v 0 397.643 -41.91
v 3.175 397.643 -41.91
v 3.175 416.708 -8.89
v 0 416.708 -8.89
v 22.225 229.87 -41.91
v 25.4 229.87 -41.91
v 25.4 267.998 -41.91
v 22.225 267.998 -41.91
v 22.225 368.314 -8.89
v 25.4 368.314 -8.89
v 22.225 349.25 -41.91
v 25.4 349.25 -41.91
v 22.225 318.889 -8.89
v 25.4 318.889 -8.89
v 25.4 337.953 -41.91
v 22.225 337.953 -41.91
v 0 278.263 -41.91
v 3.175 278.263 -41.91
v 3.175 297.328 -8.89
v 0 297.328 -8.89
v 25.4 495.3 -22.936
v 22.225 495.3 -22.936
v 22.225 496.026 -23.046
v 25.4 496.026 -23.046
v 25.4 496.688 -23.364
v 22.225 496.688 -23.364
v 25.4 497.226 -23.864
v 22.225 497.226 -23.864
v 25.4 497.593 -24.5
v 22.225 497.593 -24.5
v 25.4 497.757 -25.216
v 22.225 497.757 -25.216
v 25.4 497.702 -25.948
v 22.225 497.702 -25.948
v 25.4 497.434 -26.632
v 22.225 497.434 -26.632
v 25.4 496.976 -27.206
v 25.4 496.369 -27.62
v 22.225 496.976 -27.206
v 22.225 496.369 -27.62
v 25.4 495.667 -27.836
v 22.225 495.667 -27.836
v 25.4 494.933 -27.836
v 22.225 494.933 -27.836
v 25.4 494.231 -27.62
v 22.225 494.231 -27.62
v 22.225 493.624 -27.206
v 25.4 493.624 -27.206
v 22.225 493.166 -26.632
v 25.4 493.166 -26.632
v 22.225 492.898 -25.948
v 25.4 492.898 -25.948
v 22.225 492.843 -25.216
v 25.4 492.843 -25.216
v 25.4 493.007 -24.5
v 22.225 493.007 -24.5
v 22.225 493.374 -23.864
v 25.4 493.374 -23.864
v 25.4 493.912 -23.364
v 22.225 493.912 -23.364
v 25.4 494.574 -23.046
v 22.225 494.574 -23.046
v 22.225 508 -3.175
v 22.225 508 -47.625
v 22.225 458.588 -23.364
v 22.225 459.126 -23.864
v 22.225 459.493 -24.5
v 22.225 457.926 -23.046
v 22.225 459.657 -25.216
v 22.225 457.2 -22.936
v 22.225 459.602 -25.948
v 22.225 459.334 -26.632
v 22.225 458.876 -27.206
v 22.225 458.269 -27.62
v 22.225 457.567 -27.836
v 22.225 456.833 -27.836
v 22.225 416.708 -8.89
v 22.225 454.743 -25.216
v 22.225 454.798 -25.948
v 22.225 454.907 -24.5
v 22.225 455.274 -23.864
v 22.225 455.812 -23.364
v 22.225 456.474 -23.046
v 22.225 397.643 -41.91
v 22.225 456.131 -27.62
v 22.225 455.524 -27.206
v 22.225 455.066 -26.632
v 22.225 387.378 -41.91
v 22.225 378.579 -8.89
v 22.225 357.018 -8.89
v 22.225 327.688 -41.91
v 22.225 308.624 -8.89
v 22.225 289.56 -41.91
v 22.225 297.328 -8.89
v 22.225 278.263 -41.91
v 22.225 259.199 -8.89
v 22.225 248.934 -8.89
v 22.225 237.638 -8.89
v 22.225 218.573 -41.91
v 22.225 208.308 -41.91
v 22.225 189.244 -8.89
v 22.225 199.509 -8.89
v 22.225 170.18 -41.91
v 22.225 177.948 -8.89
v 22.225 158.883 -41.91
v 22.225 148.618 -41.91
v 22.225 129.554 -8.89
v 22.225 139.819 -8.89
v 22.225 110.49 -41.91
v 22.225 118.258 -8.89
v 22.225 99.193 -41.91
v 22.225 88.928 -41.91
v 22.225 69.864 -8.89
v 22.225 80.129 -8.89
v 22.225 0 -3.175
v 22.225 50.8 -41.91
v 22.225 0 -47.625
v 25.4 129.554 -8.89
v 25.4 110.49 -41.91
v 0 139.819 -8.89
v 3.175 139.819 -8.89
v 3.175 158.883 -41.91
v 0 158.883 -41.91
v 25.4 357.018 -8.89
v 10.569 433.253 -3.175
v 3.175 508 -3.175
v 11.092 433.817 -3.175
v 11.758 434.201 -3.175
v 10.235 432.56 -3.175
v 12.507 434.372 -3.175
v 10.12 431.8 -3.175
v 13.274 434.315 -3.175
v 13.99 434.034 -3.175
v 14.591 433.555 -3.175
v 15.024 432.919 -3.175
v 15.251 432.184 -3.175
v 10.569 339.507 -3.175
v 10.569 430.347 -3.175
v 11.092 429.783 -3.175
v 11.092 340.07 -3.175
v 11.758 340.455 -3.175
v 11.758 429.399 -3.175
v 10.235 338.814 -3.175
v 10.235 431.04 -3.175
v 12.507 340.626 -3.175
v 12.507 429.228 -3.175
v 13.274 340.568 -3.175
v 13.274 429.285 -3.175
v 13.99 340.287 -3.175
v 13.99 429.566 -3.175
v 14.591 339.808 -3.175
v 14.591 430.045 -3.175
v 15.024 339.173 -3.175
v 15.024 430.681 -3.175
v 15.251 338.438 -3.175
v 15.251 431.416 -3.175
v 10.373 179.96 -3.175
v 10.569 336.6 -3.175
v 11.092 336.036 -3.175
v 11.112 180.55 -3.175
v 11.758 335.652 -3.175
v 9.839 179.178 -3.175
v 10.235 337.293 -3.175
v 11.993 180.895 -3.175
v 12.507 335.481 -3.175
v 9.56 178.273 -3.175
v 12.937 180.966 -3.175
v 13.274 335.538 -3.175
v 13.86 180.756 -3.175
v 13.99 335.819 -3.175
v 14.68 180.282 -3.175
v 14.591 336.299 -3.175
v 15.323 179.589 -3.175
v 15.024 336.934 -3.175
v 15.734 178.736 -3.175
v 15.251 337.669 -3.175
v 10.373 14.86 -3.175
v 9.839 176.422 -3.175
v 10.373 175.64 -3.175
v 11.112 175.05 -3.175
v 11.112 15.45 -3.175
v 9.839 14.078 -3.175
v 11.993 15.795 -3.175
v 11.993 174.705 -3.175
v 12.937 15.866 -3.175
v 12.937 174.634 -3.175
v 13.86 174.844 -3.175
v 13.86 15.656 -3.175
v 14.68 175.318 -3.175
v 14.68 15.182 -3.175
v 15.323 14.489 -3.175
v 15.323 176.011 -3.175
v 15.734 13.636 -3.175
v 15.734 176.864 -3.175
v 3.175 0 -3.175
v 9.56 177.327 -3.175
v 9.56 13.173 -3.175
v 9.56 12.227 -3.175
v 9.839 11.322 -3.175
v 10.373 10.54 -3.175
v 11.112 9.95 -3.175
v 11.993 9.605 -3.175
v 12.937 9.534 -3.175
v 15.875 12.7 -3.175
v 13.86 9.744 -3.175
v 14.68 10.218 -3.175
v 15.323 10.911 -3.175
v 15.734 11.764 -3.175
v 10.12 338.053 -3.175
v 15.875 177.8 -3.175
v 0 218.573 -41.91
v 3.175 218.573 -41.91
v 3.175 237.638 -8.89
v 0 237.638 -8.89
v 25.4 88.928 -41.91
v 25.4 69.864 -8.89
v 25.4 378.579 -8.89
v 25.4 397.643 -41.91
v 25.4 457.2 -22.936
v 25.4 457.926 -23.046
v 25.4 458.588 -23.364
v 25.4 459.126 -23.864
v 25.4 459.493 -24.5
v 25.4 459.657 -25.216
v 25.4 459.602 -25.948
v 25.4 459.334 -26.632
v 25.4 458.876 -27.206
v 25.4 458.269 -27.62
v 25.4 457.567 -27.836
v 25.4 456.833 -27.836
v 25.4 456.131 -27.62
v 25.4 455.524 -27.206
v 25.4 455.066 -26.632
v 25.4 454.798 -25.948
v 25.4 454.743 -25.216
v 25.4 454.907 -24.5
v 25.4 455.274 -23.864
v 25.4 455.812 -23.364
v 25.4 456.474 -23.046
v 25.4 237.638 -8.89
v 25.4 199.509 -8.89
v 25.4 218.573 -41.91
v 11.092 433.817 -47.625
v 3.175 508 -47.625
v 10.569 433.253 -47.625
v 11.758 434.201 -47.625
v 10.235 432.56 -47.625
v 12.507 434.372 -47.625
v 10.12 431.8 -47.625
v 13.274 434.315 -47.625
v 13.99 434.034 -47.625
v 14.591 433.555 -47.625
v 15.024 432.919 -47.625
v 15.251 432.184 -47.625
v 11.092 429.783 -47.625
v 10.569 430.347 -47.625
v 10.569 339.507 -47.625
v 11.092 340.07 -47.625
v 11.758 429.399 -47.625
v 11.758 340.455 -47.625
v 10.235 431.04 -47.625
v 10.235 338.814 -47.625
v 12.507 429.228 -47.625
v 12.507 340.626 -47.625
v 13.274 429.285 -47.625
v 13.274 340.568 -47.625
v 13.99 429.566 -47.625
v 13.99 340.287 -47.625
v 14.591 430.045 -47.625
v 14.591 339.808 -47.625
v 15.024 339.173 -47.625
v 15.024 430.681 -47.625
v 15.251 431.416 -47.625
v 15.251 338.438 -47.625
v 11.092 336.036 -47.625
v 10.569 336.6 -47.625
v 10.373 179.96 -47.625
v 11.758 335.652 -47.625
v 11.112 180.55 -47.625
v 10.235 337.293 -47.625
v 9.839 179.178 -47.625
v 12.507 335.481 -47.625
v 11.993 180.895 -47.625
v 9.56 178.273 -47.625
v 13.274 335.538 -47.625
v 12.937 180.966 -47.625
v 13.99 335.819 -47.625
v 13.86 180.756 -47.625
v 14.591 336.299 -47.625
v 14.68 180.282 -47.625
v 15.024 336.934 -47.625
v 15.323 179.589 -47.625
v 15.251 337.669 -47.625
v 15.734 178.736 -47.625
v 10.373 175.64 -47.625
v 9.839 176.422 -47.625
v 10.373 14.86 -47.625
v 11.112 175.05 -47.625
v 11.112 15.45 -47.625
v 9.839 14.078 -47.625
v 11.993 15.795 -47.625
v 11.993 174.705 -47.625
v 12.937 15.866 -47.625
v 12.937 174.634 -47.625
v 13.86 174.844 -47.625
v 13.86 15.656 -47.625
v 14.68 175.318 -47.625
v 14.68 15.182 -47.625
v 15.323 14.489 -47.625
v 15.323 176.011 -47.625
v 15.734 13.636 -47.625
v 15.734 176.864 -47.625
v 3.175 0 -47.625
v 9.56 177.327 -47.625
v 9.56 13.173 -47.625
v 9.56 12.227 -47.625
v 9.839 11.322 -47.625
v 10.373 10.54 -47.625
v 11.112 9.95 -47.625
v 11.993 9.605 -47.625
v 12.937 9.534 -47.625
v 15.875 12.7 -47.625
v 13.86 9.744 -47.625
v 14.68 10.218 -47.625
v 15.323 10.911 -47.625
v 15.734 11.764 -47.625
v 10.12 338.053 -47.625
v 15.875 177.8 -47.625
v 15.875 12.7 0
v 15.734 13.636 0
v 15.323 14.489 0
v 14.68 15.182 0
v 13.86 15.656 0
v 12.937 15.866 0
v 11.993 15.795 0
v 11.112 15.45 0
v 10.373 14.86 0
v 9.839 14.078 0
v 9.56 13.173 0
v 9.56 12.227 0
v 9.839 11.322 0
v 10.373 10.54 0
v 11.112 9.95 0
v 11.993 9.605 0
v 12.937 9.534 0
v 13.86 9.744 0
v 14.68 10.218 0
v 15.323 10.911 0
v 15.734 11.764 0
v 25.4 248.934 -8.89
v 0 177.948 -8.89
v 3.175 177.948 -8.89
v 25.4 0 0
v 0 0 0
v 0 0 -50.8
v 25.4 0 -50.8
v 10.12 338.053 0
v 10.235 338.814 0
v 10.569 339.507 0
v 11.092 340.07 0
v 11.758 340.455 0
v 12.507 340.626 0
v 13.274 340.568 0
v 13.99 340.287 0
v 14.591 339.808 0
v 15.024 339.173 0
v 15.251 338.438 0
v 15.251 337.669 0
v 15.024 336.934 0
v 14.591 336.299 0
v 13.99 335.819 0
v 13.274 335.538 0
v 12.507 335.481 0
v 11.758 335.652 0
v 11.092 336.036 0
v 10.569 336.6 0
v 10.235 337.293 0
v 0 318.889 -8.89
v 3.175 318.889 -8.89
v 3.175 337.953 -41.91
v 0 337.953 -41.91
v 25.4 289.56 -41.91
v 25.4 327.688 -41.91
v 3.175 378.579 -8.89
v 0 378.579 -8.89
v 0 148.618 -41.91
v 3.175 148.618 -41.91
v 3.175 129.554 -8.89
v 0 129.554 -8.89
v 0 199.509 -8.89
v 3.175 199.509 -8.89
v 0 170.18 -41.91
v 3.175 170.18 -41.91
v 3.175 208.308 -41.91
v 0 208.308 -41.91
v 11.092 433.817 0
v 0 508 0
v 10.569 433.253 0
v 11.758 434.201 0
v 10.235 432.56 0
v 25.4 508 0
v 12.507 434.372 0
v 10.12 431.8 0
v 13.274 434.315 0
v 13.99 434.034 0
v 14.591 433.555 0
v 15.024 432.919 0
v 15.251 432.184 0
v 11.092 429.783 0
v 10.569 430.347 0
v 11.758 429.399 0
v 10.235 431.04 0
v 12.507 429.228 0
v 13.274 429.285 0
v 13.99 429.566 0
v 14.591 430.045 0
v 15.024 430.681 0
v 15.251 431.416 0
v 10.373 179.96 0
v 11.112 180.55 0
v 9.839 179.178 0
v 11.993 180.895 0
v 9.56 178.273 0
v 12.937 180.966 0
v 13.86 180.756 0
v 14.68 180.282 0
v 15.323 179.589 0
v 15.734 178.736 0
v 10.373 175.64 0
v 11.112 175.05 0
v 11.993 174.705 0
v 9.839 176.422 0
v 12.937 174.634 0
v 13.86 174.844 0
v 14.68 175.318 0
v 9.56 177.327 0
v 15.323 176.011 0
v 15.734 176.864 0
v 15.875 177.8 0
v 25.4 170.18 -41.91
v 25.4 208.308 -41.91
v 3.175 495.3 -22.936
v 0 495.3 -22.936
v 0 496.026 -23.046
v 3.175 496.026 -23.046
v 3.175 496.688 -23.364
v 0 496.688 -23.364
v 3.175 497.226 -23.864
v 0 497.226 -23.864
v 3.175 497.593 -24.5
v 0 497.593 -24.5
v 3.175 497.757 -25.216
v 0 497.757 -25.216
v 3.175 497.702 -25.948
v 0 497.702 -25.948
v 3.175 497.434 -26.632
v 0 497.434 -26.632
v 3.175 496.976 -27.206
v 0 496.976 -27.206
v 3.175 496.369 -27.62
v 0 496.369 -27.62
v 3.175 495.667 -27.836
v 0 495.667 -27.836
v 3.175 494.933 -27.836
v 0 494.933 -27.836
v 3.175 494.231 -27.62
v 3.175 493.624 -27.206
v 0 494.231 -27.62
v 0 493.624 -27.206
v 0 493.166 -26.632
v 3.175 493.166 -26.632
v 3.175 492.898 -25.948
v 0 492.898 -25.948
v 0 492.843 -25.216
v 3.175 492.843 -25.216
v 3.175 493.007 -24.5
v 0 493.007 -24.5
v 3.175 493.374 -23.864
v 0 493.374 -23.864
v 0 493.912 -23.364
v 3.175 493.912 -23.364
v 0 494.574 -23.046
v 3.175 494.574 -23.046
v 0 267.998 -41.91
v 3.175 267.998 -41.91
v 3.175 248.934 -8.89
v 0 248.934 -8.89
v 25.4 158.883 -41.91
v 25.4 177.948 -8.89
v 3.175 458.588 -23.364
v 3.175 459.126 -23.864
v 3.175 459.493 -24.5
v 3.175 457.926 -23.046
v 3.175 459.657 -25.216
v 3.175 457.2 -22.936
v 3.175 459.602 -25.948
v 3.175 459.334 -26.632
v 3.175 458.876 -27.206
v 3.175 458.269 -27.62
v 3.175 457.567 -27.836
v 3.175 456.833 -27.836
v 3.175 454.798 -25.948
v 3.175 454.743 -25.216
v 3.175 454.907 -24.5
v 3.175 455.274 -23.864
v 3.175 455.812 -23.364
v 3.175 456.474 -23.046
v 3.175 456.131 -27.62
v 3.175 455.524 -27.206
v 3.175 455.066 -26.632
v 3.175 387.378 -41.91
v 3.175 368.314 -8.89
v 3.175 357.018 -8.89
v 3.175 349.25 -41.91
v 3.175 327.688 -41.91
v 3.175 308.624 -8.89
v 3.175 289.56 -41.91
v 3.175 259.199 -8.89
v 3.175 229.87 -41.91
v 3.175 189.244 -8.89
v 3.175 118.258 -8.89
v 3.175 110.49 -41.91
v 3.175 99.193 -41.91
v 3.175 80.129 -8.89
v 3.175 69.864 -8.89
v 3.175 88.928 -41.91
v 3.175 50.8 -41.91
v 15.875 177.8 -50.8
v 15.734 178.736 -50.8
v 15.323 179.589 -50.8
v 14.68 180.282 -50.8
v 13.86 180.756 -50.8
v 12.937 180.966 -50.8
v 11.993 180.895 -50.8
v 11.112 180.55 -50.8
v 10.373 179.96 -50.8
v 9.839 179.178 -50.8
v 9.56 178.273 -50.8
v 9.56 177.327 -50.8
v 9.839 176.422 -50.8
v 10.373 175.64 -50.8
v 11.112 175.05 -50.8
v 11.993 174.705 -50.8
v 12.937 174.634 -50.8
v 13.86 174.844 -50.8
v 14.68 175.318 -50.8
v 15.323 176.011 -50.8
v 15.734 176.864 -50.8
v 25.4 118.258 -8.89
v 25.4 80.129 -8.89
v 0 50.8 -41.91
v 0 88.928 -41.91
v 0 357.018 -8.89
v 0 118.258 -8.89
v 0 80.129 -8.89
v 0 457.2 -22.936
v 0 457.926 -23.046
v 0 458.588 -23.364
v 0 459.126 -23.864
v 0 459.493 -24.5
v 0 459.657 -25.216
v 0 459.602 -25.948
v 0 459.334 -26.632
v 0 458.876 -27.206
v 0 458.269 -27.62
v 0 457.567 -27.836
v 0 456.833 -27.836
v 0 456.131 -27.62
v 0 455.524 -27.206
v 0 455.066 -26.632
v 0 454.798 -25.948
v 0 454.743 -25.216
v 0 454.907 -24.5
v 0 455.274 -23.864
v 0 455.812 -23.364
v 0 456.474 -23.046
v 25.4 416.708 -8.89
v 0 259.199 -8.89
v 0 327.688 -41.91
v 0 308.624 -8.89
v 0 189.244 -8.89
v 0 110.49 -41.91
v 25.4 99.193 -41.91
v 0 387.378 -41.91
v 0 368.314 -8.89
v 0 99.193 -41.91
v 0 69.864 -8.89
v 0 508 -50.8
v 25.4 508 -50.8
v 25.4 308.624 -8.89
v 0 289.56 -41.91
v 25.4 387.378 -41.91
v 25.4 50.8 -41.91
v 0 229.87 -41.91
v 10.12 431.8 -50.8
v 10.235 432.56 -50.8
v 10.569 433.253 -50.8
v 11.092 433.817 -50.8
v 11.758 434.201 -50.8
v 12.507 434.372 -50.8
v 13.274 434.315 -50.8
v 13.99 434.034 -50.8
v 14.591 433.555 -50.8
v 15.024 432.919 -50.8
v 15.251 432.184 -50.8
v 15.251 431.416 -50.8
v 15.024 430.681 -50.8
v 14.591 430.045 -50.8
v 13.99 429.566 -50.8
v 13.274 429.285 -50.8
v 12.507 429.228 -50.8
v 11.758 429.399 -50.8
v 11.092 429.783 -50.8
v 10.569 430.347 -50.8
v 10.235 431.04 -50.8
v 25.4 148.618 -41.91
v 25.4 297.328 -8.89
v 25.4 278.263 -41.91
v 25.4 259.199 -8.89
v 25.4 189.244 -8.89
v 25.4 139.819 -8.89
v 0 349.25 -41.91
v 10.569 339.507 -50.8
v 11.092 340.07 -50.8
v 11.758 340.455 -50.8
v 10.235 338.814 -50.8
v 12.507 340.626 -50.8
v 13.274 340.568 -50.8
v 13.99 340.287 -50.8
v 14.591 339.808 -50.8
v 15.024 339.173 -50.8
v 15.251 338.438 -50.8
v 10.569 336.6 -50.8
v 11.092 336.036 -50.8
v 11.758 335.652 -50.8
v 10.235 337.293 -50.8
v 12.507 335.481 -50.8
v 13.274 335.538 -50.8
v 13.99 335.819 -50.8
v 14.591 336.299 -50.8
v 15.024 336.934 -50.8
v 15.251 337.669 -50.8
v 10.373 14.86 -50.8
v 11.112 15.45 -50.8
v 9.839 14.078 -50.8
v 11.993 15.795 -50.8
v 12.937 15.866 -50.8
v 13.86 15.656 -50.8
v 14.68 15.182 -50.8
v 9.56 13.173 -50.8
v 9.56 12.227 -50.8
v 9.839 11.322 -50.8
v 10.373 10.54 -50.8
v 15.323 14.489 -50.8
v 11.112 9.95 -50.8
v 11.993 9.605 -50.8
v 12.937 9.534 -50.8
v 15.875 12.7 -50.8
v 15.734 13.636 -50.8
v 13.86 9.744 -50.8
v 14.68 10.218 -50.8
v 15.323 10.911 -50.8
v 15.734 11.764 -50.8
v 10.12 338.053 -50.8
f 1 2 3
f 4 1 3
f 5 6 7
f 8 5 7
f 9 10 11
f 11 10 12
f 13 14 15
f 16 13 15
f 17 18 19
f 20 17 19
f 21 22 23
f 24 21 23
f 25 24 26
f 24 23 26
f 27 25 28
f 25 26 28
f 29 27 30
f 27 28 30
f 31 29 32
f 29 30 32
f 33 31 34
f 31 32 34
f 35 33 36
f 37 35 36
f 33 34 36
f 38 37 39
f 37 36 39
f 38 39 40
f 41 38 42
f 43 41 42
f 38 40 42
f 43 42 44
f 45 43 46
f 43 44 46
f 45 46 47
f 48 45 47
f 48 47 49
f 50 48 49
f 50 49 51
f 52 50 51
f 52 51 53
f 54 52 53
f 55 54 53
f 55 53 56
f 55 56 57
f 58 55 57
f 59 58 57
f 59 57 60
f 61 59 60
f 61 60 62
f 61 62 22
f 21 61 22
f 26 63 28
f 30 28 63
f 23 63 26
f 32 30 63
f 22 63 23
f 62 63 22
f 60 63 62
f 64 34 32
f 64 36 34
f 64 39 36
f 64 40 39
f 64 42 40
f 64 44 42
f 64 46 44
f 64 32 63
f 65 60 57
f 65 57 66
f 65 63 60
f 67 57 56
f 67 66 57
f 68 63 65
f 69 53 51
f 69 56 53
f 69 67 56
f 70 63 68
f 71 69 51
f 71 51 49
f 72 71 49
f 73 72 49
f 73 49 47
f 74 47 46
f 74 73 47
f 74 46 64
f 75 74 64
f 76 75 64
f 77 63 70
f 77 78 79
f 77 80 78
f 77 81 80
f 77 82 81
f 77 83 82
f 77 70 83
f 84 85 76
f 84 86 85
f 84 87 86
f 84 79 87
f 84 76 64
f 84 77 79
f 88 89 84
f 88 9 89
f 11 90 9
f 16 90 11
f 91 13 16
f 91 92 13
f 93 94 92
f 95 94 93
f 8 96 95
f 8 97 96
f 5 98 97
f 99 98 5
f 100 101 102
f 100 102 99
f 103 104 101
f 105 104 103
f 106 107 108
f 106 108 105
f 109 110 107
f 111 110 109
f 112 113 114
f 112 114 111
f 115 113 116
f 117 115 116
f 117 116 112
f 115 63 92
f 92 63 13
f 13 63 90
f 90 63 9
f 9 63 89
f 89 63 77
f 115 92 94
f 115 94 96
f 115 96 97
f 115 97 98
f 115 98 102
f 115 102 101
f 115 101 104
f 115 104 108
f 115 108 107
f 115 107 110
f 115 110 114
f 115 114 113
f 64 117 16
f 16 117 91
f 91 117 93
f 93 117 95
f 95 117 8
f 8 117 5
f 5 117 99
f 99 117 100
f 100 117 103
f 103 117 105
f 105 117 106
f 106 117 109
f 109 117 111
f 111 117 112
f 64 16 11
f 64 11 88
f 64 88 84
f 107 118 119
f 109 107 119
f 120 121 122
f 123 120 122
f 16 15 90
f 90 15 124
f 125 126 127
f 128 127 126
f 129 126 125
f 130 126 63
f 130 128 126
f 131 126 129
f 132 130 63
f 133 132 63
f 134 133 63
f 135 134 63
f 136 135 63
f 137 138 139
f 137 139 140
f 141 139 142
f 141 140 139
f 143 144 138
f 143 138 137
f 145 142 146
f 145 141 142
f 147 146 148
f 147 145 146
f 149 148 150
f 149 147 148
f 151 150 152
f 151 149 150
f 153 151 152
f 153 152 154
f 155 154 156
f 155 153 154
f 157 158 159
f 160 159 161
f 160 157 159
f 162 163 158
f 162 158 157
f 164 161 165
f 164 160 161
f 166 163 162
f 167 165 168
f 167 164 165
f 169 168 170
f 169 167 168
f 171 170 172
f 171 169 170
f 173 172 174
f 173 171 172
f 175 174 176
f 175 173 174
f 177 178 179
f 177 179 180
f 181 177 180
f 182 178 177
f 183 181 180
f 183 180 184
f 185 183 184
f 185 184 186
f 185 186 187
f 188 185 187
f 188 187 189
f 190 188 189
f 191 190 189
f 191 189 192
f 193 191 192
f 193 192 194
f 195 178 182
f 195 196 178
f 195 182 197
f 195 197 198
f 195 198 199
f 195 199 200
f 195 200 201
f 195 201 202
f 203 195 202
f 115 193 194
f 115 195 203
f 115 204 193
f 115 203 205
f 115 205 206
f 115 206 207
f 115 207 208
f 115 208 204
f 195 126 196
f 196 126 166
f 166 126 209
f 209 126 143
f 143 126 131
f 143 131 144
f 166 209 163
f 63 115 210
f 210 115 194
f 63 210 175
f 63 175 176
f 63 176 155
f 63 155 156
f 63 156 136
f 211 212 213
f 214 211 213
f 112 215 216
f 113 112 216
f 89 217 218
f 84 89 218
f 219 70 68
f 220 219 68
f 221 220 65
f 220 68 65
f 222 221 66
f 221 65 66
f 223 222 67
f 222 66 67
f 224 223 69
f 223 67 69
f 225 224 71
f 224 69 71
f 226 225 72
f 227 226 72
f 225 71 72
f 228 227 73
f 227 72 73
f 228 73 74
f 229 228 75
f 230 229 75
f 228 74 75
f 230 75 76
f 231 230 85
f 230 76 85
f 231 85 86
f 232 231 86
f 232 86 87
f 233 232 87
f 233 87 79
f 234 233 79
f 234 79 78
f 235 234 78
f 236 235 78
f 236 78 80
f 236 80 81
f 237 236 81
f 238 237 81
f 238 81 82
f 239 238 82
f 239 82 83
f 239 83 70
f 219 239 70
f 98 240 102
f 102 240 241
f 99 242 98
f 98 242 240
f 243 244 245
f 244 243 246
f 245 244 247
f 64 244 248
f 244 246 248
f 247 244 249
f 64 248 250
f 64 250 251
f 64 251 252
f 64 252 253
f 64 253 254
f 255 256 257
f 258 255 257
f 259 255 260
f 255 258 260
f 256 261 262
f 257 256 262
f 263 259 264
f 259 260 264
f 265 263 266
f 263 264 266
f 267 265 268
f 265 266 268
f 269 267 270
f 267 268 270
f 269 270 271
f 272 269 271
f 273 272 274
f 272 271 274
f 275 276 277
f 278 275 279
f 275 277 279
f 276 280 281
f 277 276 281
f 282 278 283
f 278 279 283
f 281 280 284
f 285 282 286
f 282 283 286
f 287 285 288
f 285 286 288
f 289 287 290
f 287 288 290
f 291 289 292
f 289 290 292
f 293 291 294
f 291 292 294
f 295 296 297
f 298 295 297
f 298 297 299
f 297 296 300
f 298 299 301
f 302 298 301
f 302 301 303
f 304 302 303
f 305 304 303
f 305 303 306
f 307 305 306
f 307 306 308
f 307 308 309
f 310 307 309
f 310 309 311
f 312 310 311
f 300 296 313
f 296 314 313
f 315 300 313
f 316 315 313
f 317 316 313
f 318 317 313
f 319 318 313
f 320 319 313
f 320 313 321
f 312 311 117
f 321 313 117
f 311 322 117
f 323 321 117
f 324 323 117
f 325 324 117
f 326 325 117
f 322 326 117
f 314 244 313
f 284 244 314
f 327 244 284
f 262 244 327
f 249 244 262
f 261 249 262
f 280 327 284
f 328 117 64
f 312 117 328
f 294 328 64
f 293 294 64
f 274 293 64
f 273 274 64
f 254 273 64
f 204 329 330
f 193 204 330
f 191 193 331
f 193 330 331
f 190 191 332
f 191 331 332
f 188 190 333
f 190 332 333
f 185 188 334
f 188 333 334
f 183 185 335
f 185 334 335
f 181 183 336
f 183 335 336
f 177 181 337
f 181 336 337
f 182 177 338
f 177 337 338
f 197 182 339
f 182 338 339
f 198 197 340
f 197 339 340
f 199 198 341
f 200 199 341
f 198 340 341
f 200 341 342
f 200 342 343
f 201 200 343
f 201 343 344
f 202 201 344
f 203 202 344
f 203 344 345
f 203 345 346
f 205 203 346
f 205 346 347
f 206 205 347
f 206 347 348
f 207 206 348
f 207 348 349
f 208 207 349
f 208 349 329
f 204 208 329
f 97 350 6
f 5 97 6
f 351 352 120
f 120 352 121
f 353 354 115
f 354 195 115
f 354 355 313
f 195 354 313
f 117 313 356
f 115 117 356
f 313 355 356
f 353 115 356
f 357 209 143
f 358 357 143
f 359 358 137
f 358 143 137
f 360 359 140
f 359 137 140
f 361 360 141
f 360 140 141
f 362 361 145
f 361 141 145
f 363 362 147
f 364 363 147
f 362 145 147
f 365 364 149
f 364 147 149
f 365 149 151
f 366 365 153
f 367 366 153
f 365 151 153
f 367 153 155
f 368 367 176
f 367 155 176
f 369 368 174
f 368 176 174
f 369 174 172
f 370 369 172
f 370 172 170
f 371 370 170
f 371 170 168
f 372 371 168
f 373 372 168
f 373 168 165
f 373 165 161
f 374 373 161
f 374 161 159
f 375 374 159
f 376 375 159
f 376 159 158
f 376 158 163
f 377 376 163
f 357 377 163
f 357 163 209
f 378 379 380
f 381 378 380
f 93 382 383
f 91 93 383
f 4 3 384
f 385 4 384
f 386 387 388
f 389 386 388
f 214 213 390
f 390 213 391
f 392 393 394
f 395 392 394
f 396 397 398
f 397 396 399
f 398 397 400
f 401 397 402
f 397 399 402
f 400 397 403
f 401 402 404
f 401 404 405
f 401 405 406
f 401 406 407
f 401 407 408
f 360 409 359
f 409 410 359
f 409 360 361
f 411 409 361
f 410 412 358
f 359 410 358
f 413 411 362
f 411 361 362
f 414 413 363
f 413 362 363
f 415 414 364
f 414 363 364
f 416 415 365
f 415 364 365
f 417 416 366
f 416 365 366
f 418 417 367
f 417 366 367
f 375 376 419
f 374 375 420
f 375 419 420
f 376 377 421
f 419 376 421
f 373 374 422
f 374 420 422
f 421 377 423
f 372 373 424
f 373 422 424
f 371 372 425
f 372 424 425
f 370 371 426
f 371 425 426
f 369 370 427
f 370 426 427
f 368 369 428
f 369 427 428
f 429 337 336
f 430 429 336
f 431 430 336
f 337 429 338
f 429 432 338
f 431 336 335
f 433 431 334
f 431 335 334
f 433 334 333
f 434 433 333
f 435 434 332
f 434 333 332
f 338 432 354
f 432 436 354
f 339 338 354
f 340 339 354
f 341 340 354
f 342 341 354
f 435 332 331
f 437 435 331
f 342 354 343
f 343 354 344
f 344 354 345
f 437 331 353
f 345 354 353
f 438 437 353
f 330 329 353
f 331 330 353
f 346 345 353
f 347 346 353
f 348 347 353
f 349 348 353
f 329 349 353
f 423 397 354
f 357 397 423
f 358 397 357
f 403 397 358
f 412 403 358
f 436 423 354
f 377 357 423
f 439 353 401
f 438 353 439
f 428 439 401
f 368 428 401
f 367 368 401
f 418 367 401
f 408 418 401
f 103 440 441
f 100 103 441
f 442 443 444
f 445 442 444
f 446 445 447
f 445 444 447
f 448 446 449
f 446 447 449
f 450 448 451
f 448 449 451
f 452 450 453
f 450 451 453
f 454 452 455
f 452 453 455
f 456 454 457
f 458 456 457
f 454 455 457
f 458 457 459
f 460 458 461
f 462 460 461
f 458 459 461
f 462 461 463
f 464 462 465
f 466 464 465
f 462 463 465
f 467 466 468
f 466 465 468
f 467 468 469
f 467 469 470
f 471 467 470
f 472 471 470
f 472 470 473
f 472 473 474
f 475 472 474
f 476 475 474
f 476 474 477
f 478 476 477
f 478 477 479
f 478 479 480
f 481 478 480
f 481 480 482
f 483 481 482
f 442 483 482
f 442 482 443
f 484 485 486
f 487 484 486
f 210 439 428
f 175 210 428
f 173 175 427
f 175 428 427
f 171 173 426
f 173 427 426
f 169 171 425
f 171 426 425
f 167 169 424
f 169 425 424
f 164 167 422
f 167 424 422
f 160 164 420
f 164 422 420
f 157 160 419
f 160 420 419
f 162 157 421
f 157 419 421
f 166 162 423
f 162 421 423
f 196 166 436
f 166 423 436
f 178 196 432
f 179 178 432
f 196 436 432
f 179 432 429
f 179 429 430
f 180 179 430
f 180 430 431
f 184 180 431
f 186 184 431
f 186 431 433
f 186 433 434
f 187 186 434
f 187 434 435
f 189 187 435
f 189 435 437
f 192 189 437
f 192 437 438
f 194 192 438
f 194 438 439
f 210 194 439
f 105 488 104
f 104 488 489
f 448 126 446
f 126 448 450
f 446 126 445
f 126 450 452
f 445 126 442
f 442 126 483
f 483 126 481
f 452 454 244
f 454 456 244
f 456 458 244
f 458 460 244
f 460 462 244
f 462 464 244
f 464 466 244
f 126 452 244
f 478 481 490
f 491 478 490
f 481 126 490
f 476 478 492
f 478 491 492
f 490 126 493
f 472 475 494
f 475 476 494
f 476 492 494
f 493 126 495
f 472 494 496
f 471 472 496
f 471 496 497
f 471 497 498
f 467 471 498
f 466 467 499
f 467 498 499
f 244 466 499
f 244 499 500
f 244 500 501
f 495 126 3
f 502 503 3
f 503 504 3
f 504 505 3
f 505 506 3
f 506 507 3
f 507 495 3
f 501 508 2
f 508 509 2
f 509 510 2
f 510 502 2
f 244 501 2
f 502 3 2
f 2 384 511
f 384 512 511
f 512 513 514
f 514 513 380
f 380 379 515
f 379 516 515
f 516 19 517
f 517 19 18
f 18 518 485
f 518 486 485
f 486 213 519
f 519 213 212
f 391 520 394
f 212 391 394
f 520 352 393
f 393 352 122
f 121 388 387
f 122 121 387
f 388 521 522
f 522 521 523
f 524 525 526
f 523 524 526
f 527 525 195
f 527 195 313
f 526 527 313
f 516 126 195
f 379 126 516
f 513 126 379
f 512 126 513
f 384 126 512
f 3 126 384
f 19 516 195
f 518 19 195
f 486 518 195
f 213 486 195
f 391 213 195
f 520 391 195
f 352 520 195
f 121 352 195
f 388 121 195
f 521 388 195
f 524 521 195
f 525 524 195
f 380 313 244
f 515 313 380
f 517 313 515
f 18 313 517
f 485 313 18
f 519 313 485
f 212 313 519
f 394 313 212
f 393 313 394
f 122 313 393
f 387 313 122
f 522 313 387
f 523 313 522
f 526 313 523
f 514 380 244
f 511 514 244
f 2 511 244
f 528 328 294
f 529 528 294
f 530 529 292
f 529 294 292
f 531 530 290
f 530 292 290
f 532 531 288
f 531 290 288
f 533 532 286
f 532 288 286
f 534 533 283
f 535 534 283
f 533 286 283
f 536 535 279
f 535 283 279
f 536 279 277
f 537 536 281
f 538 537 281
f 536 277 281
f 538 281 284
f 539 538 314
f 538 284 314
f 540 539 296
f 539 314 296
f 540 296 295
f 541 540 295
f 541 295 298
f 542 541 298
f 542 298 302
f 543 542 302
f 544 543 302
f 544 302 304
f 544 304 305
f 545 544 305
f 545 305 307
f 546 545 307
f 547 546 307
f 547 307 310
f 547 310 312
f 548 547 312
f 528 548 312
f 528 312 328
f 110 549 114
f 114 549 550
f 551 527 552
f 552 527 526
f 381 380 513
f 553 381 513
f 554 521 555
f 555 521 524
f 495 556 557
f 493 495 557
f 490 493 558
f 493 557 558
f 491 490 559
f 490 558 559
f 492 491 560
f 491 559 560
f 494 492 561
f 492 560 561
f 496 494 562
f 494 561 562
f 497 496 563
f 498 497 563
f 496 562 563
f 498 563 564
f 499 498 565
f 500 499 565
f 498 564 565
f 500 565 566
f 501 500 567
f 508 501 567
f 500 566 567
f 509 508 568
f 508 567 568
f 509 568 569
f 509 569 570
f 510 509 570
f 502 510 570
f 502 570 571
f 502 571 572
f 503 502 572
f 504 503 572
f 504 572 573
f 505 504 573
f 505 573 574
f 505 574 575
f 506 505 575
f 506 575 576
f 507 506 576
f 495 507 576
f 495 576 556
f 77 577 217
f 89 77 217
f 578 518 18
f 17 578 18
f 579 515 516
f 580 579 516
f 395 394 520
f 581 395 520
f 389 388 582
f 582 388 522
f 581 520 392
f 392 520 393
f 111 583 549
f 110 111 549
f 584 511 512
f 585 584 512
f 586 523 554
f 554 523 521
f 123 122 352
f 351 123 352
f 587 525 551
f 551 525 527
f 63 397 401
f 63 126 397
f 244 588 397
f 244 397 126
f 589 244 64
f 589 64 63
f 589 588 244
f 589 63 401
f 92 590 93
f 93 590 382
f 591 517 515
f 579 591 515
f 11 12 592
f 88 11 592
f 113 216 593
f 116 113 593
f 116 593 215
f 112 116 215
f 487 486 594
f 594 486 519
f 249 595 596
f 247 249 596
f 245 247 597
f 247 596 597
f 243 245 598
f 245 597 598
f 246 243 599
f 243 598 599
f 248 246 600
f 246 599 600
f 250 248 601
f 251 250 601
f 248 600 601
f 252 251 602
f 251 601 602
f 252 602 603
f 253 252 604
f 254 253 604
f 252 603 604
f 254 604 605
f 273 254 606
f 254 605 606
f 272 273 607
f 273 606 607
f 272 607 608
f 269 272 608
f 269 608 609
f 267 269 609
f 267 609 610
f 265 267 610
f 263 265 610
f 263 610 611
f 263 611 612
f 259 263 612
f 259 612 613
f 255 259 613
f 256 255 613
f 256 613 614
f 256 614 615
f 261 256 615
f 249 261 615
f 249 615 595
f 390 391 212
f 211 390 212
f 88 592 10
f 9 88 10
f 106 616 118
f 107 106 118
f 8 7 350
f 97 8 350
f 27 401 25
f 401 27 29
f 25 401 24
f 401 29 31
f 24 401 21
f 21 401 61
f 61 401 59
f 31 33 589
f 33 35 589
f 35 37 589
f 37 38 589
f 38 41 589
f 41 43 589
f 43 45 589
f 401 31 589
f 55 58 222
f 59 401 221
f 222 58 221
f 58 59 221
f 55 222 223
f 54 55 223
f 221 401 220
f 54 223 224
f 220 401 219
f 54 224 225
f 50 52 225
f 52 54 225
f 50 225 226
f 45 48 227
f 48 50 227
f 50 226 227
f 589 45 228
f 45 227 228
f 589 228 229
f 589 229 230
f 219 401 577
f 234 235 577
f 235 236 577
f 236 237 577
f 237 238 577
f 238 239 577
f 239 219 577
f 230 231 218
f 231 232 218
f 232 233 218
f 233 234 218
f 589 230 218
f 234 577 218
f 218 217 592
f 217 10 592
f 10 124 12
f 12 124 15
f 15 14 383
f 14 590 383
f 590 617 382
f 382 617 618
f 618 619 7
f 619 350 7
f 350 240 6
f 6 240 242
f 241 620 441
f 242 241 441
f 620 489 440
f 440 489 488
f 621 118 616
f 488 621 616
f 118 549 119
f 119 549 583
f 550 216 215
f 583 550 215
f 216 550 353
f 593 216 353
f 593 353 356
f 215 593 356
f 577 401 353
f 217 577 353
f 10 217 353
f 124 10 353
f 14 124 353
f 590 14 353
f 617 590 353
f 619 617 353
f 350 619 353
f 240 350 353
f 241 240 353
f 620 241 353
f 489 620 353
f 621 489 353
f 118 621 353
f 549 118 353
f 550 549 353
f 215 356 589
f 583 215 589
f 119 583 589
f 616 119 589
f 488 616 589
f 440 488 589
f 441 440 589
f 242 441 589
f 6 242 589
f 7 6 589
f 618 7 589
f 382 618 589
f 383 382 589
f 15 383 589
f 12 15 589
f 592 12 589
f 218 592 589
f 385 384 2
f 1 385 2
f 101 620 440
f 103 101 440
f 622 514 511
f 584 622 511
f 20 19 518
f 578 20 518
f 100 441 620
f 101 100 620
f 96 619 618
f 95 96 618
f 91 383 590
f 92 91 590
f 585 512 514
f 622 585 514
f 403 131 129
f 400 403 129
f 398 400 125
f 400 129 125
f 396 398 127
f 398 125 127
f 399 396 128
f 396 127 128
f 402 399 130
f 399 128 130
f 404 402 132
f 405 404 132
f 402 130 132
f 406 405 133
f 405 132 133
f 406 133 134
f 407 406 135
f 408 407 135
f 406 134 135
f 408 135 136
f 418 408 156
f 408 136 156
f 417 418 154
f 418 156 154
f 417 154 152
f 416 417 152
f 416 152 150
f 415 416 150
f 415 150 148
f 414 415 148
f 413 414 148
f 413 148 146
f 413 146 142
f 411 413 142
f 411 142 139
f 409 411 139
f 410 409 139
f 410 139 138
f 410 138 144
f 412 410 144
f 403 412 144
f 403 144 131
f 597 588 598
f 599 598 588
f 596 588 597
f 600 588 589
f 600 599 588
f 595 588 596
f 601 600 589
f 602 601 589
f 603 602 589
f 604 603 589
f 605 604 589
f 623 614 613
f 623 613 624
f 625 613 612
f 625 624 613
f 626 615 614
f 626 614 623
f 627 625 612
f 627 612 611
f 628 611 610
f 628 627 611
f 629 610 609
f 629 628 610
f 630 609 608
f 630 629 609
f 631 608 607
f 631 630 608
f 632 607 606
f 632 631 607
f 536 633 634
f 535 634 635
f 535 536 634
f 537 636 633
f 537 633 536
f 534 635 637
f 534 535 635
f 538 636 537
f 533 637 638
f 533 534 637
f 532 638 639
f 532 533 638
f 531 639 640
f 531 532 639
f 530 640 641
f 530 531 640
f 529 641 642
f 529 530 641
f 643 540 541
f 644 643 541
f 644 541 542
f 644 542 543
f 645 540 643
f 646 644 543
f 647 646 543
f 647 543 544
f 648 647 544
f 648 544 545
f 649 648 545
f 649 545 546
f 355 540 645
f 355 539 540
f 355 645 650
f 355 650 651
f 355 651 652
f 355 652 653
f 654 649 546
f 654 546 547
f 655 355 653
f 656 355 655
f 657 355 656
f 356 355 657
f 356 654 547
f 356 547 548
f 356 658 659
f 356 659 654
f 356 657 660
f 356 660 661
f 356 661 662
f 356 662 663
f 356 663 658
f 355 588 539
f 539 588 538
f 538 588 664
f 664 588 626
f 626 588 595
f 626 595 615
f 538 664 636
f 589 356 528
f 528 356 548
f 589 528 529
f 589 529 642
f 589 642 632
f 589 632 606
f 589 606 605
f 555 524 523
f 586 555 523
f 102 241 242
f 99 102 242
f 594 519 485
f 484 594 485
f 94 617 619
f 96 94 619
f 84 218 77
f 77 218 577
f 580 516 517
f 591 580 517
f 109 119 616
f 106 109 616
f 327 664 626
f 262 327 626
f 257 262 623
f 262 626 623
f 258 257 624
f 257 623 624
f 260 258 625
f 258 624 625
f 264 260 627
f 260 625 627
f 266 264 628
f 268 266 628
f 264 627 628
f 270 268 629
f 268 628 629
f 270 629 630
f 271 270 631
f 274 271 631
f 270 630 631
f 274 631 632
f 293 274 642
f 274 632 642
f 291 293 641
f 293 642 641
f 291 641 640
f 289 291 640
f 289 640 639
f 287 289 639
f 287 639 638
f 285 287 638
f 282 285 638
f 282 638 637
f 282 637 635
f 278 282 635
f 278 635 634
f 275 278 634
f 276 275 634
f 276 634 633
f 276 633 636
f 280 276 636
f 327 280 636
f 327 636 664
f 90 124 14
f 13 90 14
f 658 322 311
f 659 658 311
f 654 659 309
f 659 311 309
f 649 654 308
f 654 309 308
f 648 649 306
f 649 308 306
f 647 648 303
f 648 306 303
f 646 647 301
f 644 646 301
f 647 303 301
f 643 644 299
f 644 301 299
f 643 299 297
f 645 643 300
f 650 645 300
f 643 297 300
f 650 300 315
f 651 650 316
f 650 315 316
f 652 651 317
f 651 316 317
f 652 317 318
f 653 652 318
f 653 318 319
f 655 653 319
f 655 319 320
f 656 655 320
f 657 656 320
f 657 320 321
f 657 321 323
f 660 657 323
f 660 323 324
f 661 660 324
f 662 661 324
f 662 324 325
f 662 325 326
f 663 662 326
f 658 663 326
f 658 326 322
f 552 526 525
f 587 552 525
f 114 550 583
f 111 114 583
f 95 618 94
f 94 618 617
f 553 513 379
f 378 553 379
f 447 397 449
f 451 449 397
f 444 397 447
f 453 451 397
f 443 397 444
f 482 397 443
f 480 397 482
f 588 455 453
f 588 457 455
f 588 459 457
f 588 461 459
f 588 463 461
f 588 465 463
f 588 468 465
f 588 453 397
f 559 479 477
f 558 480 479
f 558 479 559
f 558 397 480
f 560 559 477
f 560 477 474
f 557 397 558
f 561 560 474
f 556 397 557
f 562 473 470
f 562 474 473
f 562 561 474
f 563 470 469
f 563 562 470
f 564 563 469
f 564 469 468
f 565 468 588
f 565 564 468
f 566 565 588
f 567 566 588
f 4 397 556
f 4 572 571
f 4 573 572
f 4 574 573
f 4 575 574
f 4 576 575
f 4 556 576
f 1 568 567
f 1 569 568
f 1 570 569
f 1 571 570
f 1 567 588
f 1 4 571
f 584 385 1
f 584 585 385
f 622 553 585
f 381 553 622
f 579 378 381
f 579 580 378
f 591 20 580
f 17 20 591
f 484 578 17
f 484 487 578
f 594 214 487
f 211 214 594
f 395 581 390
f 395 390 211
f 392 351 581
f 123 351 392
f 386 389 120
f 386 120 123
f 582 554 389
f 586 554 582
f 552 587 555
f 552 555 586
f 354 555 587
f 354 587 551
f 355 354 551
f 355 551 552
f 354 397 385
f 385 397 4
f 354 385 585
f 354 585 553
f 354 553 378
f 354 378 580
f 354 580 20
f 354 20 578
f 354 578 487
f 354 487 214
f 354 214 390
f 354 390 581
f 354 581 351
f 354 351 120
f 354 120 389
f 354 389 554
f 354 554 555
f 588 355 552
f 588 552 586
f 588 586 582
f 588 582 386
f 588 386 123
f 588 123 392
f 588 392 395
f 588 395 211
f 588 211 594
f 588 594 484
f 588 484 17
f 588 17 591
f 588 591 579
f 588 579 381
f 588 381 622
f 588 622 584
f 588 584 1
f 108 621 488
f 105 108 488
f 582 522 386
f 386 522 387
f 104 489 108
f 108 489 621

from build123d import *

# Parameters (mm, degrees)
SKETCH1_W           = 25.4
SKETCH1_H           = 50.8
SKETCH1_W_2         = 19.05
SKETCH1_H_2         = 44.45
BOSS_EXTRUDE1_DEPTH = 508
SKETCH3_R           = 3.175
CUT_EXTRUDE1_DEPTH  = 512.165139656
SKETCH4_R           = 2.4638
CUT_EXTRUDE2_DEPTH  = 512.165139656
CUT_EXTRUDE3_DEPTH  = 512.165139656
LPATTERN1_COUNT     = 6
LPATTERN1_PITCH     = 59.69
SKETCH6_R           = 2.5796875
CUT_EXTRUDE4_DEPTH  = 512.165139656


with BuildPart() as part:
    # Sketch1 → Boss-Extrude1 (new body)
    with BuildSketch(Plane(origin=(0, 0, 0), x_dir=(1, 0, 0), z_dir=(0, 1, 0))):
        with Locations((12.7, 25.4)):
            Rectangle(SKETCH1_W, SKETCH1_H)
        with Locations((12.7, 25.4)):
            Rectangle(SKETCH1_W_2, SKETCH1_H_2, mode=Mode.SUBTRACT)
    extrude(amount=BOSS_EXTRUDE1_DEPTH)

    # Sketch3 → Cut-Extrude1 (cut, through all)
    with BuildSketch(Plane.XY):
        with Locations((12.7, 177.8)):
            Circle(SKETCH3_R)
        with Locations((12.7, 12.7)):
            Circle(SKETCH3_R)
    extrude(amount=-CUT_EXTRUDE1_DEPTH, mode=Mode.SUBTRACT)

    # Sketch4 → Cut-Extrude2 (cut, through all)
    with BuildSketch(Plane.ZY):
        with Locations((-25.4, 457.2)):
            Circle(SKETCH4_R)
        with Locations((-25.4, 495.3)):
            Circle(SKETCH4_R)
    extrude(amount=-CUT_EXTRUDE2_DEPTH, mode=Mode.SUBTRACT)

    # Sketch5 → Cut-Extrude3 (cut, through all)
    with BuildSketch(Plane(origin=(25.4, 0, 0), x_dir=(0, 0, -1), z_dir=(1, 0, 0))):
        Polygon((41.91, 88.928211777), (8.89, 69.864105889), (41.91, 50.8), align=None)
        Polygon((41.91, 99.193499563), (8.89, 118.257605452), (8.89, 80.129393675), align=None)
    cut_extrude3 = extrude(amount=-CUT_EXTRUDE3_DEPTH, mode=Mode.SUBTRACT)

    # LPattern1: Cut-Extrude3 ×6
    with Locations(*[(0, i * LPATTERN1_PITCH, 0) for i in range(1, LPATTERN1_COUNT)]):
        add(cut_extrude3, mode=Mode.SUBTRACT)

    # Sketch6 → Cut-Extrude4 (cut, through all)
    with BuildSketch(Plane(origin=(0, 0, -50.8), x_dir=(-1, 0, 0), z_dir=(0, 0, -1))):
        with Locations((-12.7, 431.8)):
            Circle(SKETCH6_R)
        with Locations((-12.7, 338.053316528)):
            Circle(SKETCH6_R)
    extrude(amount=-CUT_EXTRUDE4_DEPTH, mode=Mode.SUBTRACT)


solid = part.part
